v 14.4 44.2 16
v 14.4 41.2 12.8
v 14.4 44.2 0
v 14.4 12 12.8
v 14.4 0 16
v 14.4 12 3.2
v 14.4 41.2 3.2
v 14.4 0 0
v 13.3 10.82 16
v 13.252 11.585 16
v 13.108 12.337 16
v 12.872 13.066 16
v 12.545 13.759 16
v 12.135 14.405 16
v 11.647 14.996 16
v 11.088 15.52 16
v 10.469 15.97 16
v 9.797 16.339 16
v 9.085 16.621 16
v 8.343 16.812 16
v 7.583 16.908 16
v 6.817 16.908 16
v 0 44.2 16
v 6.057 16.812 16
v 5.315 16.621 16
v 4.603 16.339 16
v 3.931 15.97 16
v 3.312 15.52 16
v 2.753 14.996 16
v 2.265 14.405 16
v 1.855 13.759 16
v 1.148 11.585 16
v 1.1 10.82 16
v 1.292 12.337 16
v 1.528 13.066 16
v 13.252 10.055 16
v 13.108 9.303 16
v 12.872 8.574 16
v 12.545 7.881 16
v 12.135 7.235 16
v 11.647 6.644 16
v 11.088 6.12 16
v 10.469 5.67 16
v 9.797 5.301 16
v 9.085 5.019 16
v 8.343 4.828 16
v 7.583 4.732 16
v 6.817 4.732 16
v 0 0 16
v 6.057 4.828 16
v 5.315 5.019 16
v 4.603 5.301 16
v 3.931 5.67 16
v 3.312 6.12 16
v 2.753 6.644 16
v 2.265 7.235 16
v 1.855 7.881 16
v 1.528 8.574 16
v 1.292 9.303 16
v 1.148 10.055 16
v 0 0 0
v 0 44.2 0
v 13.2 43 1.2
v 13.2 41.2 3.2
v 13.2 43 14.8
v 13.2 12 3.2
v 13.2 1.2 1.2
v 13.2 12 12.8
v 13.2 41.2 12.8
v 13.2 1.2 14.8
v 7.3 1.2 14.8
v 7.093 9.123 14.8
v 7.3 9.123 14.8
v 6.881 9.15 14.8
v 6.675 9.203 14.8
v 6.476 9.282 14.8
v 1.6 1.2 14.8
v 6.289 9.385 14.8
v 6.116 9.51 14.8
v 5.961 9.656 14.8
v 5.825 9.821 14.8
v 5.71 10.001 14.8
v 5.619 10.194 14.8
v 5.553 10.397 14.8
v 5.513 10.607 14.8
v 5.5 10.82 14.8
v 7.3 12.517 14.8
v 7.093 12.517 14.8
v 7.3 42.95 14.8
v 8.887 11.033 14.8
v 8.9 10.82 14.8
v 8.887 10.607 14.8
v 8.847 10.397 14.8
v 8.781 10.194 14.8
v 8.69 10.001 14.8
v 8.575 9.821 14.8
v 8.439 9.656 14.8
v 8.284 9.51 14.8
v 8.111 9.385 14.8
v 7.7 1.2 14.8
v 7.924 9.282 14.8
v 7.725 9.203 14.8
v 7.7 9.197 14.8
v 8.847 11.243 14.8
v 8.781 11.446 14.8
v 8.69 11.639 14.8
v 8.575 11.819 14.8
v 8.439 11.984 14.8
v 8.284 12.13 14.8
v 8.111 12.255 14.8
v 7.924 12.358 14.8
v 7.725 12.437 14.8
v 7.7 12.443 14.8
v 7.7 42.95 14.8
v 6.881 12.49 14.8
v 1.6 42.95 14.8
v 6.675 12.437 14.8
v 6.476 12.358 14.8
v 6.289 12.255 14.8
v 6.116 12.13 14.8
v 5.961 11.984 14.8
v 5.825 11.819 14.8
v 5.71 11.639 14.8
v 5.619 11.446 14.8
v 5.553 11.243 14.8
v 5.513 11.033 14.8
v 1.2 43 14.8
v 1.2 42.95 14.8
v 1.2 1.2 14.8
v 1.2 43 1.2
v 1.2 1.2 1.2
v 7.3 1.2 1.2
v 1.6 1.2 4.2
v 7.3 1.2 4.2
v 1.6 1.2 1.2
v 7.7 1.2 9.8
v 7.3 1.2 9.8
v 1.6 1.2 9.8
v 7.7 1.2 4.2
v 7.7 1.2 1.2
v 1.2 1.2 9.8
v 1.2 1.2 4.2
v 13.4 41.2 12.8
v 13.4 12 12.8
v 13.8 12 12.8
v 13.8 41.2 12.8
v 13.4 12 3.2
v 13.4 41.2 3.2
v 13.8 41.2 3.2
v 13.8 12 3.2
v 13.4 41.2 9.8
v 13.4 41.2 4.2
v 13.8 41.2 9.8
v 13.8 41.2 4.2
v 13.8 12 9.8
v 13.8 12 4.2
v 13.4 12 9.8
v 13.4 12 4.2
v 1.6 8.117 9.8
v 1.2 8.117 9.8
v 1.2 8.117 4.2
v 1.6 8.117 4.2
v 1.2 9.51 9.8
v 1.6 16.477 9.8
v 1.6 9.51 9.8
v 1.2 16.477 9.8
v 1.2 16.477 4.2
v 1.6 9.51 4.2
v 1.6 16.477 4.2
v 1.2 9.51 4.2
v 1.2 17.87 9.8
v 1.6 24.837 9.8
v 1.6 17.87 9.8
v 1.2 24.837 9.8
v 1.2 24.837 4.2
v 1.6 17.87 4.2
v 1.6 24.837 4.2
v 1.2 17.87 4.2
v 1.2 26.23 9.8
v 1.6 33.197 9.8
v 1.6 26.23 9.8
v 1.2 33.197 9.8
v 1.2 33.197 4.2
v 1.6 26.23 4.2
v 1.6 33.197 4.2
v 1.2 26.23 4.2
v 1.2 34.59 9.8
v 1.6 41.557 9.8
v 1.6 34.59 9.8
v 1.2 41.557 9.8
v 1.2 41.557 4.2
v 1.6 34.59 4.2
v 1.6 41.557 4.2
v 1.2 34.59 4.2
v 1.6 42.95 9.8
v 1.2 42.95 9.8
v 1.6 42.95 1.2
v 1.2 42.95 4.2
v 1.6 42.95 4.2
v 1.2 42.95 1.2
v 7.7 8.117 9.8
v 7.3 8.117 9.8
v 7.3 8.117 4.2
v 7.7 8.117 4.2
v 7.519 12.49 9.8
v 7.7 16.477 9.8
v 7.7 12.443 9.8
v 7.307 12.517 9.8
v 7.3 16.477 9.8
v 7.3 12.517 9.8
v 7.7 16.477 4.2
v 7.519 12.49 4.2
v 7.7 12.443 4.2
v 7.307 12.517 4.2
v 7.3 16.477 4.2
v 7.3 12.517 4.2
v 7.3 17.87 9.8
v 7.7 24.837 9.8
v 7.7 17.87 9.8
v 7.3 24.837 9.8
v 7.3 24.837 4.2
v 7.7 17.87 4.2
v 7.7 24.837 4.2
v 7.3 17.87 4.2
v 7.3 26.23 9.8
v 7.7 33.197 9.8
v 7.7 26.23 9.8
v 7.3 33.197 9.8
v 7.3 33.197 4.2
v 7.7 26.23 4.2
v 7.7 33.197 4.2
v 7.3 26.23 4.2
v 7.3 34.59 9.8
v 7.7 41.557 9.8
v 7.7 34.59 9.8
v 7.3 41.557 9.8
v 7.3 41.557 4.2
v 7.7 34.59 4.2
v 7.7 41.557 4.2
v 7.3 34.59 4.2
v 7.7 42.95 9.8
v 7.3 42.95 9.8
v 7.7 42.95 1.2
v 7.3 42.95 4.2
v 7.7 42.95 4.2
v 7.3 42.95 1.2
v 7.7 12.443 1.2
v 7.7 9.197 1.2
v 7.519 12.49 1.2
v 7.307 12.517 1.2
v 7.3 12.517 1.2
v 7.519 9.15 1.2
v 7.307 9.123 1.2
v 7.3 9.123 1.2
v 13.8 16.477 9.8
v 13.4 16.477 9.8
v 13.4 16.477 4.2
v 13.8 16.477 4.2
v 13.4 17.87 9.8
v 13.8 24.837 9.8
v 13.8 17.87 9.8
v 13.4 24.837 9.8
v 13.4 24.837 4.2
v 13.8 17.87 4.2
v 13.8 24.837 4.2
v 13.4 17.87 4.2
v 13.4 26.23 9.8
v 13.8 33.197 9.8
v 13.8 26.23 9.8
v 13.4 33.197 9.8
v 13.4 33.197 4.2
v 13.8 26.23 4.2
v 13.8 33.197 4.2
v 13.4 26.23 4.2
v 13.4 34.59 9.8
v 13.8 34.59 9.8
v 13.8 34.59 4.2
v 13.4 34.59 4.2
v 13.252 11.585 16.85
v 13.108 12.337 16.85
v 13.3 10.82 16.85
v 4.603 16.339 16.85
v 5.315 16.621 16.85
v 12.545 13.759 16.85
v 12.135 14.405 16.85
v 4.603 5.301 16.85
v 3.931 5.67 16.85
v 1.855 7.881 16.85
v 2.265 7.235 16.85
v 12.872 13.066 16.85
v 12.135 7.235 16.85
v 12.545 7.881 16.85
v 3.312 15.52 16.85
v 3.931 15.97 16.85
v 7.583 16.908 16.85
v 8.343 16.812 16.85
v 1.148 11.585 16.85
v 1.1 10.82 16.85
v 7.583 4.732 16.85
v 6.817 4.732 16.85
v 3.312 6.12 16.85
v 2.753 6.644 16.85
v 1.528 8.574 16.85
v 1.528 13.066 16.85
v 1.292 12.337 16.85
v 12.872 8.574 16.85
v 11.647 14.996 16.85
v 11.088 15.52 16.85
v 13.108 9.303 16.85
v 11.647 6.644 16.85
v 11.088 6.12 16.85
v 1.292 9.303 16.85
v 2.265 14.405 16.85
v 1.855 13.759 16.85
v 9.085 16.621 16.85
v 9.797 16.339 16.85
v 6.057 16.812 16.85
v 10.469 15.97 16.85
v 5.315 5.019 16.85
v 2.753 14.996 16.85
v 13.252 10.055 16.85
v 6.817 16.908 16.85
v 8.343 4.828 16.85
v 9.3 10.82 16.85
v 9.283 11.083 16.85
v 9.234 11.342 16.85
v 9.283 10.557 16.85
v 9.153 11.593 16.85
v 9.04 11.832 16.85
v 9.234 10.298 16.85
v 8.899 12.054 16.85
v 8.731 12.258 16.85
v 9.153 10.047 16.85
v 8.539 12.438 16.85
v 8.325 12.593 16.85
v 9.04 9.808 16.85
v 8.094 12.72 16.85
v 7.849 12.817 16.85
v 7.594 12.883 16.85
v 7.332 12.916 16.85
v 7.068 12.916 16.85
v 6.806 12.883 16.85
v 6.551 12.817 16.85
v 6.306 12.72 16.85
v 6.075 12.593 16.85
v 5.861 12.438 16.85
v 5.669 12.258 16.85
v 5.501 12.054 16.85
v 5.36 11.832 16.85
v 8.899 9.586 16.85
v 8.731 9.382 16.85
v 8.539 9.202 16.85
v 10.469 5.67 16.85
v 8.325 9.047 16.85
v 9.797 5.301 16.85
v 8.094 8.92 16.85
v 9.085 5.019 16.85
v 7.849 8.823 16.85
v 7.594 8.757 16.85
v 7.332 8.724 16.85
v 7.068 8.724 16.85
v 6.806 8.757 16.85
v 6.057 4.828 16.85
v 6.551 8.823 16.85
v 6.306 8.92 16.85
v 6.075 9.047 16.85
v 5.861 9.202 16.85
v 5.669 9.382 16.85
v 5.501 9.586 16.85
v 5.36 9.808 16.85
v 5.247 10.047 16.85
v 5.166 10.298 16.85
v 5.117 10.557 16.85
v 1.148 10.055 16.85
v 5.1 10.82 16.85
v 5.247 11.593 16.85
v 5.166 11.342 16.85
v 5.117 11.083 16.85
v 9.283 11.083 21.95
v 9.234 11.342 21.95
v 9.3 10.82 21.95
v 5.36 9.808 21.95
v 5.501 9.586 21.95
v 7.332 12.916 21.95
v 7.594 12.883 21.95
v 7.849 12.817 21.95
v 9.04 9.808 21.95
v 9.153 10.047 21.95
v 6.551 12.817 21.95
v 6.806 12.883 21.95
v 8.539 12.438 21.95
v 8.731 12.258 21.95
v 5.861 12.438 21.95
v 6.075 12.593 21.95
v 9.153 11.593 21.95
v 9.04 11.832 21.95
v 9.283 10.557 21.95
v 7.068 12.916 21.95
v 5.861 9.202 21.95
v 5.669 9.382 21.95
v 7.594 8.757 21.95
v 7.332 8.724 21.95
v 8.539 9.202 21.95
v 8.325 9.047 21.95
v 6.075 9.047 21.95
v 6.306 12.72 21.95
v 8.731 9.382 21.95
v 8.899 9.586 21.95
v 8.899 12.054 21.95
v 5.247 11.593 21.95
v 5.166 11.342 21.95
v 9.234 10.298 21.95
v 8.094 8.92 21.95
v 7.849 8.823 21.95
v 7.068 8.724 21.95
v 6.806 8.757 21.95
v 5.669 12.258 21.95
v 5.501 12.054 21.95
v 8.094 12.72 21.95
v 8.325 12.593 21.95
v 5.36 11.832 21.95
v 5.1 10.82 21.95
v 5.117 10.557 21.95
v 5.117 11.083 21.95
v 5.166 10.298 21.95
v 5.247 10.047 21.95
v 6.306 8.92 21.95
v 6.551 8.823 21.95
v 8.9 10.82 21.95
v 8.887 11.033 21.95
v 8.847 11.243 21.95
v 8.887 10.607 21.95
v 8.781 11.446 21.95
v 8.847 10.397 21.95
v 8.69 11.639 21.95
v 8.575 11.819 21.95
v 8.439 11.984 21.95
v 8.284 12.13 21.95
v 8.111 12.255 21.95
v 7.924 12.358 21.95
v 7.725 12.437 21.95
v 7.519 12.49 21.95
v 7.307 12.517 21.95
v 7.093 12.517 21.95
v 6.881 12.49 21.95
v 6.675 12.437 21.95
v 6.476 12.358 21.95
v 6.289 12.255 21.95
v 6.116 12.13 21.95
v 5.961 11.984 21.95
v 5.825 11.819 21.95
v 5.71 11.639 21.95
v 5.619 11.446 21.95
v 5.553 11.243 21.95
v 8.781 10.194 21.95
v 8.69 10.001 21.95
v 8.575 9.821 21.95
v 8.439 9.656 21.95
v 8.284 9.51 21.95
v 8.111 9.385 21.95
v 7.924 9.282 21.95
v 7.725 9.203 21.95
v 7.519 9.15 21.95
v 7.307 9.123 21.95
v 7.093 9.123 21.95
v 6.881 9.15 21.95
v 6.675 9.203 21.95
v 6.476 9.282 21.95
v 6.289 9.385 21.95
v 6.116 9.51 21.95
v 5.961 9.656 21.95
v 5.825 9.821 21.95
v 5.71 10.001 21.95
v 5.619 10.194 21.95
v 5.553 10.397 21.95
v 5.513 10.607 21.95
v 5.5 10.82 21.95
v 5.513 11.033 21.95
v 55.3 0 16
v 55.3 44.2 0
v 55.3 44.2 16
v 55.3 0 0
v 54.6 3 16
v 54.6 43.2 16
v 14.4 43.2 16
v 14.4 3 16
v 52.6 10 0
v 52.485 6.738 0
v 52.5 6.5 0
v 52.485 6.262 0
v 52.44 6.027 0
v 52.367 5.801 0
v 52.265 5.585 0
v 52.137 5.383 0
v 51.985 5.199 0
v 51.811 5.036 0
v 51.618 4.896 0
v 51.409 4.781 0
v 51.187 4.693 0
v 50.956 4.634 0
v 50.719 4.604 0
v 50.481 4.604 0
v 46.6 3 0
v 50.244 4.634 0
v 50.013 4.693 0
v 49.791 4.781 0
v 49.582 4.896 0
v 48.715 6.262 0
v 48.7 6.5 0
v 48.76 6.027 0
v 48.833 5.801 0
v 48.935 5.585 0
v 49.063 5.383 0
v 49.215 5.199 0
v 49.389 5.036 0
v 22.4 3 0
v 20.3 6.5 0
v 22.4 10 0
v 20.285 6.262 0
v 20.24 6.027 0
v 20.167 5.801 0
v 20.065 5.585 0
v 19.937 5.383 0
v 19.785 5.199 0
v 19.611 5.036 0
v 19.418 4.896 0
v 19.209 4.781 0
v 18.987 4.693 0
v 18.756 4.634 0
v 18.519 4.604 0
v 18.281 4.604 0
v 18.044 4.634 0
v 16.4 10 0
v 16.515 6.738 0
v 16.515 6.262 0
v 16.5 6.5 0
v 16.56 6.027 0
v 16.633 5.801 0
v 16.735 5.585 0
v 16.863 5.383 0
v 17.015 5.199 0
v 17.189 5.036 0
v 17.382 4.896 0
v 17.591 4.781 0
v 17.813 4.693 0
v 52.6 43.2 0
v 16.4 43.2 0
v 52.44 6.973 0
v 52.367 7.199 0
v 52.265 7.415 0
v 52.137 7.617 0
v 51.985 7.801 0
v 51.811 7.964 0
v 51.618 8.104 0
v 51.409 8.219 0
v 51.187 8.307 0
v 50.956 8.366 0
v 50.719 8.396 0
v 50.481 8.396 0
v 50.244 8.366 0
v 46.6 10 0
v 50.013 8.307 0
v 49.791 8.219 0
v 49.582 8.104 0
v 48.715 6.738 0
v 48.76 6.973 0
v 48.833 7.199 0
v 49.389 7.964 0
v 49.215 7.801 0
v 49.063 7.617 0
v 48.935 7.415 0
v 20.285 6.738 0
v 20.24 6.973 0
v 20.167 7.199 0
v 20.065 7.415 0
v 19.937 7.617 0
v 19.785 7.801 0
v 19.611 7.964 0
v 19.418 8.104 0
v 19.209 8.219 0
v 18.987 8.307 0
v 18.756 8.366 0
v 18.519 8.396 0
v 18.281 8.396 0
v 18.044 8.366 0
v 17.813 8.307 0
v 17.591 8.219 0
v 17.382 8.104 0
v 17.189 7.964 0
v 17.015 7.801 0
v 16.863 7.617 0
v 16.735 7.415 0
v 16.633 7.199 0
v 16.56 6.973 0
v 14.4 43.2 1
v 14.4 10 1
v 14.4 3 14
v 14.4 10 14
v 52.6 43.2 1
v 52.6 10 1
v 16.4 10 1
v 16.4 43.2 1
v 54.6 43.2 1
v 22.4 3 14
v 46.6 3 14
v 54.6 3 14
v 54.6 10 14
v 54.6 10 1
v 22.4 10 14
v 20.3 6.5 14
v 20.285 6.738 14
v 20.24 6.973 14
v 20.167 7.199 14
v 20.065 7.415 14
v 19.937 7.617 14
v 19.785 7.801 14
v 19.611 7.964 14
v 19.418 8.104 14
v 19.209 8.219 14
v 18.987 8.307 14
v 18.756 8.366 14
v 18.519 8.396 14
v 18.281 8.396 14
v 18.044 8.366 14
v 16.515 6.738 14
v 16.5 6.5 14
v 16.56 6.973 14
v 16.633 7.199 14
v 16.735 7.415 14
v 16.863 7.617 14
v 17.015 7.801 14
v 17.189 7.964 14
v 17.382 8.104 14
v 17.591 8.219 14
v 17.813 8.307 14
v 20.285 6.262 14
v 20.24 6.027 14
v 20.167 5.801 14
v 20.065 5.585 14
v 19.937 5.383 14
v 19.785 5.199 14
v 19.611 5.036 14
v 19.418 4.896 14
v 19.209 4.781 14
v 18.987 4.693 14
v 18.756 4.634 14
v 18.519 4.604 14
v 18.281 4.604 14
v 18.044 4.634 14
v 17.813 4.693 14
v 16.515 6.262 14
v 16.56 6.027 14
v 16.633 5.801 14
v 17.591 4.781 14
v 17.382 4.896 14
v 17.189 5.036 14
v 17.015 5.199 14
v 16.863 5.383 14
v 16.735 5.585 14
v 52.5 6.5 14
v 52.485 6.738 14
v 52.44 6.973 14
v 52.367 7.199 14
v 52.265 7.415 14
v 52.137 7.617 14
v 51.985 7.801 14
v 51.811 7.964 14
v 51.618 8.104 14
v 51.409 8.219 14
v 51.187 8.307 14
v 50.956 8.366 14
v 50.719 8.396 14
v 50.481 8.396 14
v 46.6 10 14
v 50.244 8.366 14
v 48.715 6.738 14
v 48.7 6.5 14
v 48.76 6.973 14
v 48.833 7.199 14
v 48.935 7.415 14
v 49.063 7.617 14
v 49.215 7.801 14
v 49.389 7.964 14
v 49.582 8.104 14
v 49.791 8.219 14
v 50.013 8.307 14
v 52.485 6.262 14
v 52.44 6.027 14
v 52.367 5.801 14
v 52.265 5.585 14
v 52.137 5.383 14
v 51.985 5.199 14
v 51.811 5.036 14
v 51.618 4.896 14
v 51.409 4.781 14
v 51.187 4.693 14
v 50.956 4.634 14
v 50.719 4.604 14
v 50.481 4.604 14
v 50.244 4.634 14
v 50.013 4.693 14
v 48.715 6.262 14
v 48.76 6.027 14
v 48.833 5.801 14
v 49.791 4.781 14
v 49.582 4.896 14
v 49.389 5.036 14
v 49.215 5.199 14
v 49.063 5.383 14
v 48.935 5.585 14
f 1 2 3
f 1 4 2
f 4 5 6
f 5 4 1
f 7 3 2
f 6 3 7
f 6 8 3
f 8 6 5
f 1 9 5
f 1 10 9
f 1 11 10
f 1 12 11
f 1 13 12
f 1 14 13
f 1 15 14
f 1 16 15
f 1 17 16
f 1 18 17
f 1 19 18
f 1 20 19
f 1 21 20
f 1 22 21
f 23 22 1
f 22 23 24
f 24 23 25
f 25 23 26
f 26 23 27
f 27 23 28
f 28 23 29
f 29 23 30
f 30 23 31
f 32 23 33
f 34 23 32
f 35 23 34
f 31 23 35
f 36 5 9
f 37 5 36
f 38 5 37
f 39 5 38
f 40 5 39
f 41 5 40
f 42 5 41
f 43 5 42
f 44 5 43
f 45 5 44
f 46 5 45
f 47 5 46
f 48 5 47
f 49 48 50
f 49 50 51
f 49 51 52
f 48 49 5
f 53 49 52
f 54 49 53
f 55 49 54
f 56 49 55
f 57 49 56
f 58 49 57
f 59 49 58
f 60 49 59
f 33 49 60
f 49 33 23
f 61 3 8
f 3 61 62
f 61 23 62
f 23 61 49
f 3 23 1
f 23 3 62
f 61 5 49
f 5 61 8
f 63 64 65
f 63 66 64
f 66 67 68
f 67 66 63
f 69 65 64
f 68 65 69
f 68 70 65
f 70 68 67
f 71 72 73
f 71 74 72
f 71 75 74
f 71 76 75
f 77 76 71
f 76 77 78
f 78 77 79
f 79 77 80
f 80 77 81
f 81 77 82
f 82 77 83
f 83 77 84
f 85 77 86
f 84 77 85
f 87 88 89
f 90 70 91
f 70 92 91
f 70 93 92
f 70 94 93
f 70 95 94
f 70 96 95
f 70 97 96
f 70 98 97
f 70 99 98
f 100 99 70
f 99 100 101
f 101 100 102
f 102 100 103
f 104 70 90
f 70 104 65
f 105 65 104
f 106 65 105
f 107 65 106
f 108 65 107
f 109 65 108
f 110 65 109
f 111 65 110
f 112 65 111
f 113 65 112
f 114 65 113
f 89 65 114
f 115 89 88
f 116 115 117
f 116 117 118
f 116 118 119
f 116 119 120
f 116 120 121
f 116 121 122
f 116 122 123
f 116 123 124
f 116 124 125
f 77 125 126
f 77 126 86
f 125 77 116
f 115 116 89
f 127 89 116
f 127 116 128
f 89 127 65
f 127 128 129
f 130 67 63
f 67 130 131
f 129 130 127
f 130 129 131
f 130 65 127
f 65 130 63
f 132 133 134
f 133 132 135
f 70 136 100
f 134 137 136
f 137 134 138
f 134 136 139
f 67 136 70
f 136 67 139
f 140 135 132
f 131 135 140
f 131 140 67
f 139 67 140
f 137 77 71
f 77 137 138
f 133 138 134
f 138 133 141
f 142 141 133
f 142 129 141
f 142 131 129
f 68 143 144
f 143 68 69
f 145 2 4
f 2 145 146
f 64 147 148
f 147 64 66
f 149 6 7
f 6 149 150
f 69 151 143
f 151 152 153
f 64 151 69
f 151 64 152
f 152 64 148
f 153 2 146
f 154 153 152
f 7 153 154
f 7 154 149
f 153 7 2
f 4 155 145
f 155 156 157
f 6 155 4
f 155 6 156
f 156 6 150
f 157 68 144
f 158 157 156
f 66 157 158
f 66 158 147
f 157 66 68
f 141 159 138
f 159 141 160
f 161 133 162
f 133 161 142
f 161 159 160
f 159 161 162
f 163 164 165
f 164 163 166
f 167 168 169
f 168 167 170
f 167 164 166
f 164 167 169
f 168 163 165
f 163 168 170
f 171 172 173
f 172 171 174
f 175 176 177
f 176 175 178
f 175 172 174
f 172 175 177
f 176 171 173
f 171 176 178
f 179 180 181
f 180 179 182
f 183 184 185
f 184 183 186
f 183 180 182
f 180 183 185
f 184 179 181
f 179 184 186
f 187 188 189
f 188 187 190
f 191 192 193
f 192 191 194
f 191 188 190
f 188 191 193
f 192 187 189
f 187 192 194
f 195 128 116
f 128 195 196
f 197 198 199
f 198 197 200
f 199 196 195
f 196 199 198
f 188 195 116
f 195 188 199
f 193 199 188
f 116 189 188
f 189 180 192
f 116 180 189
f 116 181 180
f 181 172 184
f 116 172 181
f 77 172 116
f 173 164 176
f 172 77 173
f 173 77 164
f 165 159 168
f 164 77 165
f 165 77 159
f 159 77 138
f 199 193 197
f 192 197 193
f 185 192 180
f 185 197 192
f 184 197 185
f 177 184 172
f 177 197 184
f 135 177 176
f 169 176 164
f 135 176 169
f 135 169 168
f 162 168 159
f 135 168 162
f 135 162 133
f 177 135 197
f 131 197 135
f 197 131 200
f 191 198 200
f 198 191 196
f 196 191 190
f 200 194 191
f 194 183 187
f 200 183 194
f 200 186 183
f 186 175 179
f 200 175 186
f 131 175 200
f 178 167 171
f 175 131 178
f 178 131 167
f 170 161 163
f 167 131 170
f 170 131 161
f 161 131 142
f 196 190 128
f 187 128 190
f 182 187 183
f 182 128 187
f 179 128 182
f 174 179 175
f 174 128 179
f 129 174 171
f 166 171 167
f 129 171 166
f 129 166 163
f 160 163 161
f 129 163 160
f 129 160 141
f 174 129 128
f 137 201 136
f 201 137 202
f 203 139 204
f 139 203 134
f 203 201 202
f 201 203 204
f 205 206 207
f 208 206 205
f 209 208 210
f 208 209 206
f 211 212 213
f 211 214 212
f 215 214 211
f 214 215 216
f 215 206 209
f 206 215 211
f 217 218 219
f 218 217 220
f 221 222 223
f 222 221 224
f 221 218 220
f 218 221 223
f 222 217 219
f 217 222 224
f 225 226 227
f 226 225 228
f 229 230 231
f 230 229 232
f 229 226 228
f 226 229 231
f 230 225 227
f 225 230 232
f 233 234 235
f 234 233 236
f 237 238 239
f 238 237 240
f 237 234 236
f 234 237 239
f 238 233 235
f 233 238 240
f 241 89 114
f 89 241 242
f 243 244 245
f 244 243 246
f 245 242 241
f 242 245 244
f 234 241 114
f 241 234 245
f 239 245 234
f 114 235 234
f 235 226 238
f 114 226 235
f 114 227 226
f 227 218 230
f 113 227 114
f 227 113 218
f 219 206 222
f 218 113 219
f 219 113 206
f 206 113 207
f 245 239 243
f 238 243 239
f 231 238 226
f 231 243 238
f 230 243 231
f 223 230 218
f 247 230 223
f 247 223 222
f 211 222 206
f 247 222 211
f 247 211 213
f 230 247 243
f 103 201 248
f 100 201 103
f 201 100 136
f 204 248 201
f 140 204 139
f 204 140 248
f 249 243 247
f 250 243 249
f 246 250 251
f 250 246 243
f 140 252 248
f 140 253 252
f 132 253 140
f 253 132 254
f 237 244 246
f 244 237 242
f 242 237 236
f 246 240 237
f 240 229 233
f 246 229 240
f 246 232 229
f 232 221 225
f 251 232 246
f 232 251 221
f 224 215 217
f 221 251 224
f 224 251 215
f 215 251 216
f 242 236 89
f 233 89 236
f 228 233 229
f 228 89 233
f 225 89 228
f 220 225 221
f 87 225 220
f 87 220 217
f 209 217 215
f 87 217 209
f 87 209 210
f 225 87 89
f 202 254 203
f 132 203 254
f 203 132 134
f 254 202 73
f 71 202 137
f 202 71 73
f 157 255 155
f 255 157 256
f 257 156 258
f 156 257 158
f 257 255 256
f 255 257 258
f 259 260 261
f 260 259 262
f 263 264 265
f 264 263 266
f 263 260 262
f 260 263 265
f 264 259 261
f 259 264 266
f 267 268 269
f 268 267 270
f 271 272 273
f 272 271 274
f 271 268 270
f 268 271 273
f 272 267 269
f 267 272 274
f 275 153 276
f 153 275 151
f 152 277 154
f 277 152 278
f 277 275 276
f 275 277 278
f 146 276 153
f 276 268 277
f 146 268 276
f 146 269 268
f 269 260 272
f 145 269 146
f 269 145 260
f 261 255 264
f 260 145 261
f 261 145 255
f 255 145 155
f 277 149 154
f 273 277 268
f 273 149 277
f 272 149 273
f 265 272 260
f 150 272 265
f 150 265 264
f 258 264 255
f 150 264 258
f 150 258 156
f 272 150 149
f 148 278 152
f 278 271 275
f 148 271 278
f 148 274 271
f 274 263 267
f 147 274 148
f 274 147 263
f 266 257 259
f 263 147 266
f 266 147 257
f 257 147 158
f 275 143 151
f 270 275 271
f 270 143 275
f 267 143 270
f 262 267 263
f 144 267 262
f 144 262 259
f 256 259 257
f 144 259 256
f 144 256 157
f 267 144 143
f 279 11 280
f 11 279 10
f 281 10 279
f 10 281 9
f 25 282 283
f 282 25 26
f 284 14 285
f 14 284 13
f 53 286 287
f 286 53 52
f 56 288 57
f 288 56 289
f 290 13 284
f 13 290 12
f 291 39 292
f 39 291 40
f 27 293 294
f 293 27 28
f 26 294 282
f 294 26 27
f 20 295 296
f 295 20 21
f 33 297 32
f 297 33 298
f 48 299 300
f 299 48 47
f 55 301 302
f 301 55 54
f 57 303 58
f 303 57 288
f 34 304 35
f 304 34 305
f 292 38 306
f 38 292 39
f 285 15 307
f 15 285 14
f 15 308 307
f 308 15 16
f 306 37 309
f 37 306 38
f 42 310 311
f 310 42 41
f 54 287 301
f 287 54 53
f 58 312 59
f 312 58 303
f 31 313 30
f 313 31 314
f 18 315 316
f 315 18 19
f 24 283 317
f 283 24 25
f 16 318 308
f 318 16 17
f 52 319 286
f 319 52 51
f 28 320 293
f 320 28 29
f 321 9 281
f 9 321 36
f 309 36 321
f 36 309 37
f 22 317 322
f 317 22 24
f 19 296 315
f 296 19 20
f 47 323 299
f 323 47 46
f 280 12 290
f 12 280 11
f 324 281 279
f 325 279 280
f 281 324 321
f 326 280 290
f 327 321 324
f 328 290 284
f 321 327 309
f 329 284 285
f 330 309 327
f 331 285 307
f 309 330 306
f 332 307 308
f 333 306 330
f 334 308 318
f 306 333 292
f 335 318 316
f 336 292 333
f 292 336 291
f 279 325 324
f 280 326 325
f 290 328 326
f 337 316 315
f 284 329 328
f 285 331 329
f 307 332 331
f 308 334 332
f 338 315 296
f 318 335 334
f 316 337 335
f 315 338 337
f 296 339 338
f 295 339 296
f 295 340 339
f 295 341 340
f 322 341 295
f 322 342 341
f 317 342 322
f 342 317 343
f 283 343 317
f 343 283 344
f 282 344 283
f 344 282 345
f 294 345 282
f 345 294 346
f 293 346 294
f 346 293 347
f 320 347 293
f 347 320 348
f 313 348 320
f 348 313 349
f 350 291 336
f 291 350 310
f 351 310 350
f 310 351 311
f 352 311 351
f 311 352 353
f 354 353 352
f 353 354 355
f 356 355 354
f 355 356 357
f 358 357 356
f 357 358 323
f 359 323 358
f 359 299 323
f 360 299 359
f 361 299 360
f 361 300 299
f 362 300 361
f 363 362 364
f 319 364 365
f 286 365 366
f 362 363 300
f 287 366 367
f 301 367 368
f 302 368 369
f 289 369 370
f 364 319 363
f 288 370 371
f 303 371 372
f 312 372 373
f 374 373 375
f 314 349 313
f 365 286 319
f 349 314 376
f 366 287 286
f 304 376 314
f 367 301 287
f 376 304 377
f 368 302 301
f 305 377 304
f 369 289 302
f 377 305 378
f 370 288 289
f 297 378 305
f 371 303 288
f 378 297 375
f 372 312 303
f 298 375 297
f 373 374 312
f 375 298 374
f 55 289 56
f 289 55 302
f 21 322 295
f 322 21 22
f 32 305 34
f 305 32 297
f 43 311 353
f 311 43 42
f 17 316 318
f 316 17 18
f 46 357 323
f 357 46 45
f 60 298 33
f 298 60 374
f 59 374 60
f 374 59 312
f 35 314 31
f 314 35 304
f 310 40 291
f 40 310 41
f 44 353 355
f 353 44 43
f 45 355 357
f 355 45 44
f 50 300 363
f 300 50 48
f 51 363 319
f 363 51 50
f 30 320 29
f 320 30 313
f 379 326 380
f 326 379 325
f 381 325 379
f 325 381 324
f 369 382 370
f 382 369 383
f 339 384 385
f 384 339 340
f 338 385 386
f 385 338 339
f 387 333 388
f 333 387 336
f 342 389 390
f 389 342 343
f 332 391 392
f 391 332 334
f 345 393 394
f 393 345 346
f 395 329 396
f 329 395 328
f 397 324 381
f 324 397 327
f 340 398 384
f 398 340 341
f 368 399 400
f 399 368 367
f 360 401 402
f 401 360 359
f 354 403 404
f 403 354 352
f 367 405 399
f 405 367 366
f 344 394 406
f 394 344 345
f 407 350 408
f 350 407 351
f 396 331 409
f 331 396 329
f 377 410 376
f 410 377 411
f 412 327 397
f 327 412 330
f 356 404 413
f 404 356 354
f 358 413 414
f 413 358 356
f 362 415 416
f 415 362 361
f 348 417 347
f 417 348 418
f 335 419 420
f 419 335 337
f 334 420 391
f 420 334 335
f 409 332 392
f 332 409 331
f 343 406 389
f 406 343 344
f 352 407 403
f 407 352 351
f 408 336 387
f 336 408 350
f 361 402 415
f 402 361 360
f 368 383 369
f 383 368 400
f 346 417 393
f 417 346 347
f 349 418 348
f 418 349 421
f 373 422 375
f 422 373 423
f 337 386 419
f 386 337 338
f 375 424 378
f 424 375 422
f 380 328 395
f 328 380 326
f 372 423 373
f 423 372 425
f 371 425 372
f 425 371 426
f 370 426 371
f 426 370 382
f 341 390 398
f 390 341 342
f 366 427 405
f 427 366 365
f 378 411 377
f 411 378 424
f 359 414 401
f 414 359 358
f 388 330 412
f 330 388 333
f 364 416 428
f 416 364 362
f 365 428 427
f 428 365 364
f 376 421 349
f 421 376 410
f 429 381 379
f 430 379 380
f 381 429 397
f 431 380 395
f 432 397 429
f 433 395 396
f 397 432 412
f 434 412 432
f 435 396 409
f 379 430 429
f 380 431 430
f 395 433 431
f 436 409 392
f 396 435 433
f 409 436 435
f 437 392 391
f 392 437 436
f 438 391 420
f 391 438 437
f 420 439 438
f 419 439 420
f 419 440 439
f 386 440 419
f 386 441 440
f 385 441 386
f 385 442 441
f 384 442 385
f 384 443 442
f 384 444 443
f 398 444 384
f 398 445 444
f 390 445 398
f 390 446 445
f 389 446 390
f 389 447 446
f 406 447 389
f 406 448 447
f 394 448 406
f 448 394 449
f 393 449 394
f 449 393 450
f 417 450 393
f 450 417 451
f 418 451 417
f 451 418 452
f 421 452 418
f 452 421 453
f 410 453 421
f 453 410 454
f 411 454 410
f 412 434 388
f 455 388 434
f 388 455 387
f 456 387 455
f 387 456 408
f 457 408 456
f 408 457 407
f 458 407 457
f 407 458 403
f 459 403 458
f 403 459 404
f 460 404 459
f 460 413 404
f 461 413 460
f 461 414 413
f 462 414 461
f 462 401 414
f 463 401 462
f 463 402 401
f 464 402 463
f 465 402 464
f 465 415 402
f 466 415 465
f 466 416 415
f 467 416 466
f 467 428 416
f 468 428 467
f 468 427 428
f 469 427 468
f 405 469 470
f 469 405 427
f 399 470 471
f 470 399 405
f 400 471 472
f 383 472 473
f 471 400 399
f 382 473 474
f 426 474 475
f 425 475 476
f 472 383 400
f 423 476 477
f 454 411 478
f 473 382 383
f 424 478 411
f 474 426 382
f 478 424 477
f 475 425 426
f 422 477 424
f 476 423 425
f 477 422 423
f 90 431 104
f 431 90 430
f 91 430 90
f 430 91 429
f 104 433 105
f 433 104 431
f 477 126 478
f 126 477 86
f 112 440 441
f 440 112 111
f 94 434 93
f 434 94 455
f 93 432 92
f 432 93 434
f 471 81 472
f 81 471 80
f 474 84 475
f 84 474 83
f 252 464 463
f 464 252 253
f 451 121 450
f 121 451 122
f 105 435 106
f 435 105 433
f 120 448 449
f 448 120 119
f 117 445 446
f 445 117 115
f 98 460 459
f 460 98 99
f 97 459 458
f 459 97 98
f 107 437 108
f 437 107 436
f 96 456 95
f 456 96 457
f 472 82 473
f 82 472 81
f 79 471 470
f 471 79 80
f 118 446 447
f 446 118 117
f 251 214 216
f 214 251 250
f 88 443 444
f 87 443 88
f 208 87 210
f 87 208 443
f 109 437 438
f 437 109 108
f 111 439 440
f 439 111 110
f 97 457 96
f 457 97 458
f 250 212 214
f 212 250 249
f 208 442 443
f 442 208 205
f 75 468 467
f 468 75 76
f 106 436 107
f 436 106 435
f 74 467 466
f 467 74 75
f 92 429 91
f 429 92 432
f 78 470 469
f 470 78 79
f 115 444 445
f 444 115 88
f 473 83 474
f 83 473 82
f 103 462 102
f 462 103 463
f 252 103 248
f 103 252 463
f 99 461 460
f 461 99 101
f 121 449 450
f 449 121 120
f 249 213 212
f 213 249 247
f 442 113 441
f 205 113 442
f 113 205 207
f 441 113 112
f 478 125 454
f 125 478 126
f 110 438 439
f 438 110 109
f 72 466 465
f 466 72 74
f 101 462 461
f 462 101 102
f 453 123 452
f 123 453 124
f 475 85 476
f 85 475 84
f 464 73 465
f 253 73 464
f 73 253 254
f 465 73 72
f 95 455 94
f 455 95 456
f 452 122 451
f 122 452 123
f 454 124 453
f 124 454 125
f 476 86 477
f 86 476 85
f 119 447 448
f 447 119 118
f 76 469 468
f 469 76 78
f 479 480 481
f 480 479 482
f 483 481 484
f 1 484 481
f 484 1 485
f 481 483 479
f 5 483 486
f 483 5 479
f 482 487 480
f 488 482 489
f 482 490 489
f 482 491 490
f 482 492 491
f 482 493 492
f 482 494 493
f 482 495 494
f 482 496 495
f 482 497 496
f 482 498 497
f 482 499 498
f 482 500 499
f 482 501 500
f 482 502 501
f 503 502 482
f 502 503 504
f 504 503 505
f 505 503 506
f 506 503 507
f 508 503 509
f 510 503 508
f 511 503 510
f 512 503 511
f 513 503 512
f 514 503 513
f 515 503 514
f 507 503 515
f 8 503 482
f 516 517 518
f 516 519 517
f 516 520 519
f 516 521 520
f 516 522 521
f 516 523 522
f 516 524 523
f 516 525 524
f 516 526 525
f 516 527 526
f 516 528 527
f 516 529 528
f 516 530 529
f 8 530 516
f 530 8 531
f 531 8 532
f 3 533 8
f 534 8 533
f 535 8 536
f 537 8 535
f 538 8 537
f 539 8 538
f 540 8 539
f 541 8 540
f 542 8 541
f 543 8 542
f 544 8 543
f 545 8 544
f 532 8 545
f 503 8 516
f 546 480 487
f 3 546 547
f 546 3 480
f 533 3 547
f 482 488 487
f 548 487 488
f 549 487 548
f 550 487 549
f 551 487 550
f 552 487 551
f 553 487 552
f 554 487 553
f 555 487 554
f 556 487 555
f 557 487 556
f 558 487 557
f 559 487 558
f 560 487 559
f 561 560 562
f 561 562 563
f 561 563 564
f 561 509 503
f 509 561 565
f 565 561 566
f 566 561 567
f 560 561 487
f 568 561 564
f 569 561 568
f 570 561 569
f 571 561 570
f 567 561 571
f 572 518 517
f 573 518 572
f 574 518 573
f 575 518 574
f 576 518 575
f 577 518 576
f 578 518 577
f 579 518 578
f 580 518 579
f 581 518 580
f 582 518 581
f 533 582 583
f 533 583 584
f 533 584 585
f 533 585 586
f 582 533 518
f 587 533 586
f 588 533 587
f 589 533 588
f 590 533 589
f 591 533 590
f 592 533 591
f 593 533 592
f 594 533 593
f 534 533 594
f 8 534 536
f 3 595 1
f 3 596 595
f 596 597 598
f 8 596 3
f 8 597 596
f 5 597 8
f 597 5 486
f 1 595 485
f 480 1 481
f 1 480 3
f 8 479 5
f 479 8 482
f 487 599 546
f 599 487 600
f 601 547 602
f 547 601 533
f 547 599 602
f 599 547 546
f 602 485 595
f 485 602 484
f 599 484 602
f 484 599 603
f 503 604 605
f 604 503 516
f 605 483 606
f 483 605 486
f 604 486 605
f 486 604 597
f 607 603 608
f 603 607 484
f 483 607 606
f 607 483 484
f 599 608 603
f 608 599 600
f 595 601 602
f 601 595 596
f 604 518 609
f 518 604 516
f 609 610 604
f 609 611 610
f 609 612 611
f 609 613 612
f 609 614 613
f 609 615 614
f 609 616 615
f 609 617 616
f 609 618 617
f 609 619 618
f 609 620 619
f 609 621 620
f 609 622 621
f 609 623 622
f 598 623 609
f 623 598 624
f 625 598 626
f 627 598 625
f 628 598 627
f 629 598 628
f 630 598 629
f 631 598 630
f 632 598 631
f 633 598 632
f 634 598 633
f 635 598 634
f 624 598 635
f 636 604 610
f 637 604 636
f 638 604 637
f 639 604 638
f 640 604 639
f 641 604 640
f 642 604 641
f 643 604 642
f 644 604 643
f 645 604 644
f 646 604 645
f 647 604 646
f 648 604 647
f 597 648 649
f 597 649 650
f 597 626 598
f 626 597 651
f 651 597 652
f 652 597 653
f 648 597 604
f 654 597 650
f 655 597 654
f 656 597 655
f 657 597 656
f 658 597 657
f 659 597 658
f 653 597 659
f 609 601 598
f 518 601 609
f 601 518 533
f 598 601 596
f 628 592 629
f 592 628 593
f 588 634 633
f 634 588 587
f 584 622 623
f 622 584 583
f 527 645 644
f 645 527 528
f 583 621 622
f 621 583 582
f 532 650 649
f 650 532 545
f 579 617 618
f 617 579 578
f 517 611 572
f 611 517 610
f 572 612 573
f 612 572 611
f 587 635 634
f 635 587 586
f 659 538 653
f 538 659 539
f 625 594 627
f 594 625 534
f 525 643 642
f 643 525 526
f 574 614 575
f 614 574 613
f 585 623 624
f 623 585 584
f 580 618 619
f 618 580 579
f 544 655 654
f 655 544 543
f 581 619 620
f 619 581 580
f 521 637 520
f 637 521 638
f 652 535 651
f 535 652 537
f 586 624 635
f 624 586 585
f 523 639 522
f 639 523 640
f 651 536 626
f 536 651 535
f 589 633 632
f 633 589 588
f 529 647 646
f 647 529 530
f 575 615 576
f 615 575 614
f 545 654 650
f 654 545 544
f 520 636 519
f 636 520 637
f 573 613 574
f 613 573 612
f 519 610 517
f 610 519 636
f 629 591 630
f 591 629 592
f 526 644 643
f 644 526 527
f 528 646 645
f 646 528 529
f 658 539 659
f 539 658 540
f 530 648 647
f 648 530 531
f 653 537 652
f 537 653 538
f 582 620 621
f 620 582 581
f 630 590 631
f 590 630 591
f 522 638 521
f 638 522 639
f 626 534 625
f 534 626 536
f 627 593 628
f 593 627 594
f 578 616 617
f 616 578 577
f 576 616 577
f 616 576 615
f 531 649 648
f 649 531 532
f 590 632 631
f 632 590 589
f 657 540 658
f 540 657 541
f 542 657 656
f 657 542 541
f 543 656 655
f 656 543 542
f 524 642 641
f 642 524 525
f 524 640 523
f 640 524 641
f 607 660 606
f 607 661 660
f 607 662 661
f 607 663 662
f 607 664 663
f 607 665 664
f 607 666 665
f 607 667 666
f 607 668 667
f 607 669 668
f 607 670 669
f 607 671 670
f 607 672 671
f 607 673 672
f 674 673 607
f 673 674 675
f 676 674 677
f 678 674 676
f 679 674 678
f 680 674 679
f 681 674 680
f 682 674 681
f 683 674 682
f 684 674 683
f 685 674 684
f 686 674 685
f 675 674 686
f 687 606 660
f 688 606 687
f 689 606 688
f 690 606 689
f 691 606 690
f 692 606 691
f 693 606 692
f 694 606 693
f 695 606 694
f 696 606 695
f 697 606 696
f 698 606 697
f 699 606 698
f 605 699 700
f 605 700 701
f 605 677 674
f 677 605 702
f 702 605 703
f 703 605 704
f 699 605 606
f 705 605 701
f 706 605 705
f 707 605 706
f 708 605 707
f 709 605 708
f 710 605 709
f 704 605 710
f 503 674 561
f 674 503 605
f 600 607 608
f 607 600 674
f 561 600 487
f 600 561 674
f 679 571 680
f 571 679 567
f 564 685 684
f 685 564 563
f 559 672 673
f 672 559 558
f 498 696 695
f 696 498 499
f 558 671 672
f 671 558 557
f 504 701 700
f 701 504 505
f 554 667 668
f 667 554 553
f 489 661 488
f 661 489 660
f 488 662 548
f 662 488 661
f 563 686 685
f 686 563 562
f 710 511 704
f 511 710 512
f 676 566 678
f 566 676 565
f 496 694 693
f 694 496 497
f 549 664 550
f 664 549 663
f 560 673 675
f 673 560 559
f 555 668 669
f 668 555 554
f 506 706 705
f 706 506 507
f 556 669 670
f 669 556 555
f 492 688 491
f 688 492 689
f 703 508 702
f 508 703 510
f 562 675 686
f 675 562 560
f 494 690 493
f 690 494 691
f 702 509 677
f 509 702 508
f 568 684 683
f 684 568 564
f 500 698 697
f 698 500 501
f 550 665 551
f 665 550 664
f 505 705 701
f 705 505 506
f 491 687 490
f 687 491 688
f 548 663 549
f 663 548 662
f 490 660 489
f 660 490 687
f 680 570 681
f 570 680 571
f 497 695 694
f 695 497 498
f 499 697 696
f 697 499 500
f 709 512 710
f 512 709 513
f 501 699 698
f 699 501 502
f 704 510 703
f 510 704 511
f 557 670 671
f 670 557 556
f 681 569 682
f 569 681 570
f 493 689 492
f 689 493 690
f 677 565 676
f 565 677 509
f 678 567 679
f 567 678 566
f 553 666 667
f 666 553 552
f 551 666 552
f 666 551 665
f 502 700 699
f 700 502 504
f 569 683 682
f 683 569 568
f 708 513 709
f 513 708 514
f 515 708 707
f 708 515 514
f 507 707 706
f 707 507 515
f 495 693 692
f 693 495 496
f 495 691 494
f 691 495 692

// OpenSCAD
// MK8 air cage, for Prusa i3 Pro B. traps air from extruder feeder cooler, routes to pipe end, where an air nozzle
// can be connected to.
//
// 2016Sep13, ls  (http://www.thingiverse.com/Bushmills)
//	v0.0.1   initial version
//	v0.0.2   support changed to interleaved pillars 
// 2016Sep14, ls
//	v0.0.3   support changed to perforated walls. lowered blocks. thicker walls around air chamber.
//               gave pipe end foundation more substance.
// 2016Sep15, ls
//	v0.0.4   added foundation to pipe end to avoid sagging
// 2016Sep19, ls
//	v0.0.5   eliminated "pillars_" from air chamber variable names, changing to "wall_" 
//	         own variable for pipe end wall thickness. rather than reusing air chamber wall thickness. 
//	         slicing may benefit from slic3r --spiral-vase option.

$fn=50;
// show object inside at percentage depth
explode=0;			// [0:100]

// *********************************************************
/* main frame setting */

// adjustable in very small steps, because this determines the degree of leakyness 
cooler_width=40.2;		// [32:0.1:64]

// adjustable in very small steps, because this determines the degree of leakyness 
cooler_height=40.2;		// [32:0.1:64]

// overall depth of item, excluding pipe end
depth=16;			// [10:0.1:32]

// how far does extruder side retainment protrude into cooler
brim=2;                         // [0:0.1:10]

// how thick is extruder side retainment
brim_strength=1;			// [0.4:0.1:5]

// thickness of frame opposite of air chamber 
far_wall=0.7;			// [0.4:0.1:5]

// thickness of frame on side of holding blocks 
base=3;				// [0.4:0.1:10]

// thickness of opposite side  
roof_wall=1;			// [0.4:0.1:5]

height=base+cooler_height+roof_wall;


// *************************************************
/* mounting blocks */

block_height=7;			// [2:0.1:20]

// affects hole distance, which is (cooler_width - block_width) as holes are block centered 
block_width=8;			// [2:0.1:20]

// bore diameter for screws
mount_hole=3.8;			// [2:0.1:8]

// fan immersion shortens blocks on fan side, allowing fan to penetrate air cage, reducing leakage.
fan_immersion=1;		// [0:0.1:8]


// ***********************
/* air chamber settings */

// thickness of walls surrounding air chamber, and pipe and wall strength
air_chamber_wall=1.2;		// [0.1:0.1:8]

// "chamber" refers to dimensions of hollow space inside
air_chamber_width=12;		// [4:1:32]

// brim around air passage
air_passage_brim=2;		// [0:0.1:8]

airpassage_length=cooler_height-block_height-2*air_passage_brim;

width=far_wall+cooler_width+air_chamber_width+2*air_chamber_wall;

air_chamber_height=height-2*air_chamber_wall;
air_chamber_depth=depth-2*air_chamber_wall;
air_chamber_x=far_wall+cooler_width+air_chamber_wall;
air_chamber_y=air_chamber_wall+0;

// support for pipe end sided roof. distance means "maximum distance", as actual distance will be calculated
wall_distance=8;		// [1:0.1:24]

// thickness of air chamber walls, seperating lanes
wall_strength=0.4;		// [0.2:0.1:2]

// **********************************************
/* pipe end */

pipe_end_foundation_length=1;	// [0:0.1:8]
pipe_end_foundation_foot=4; 	// [0:0.1:8]
pipe_end_length=5;		// [0:0.1:16]

// outer diameter
pipe_end_diameter=4.2;		// [1:0.1:8]
pipe_end_wall=0.4;		// [0.2:0.1:4]
pipe_end_elevation_percent=20;	// [0:100]

pipe_end_radius=pipe_end_diameter/2;
pipe_end_x=air_chamber_width/2+air_chamber_wall;
pipe_end_y=air_chamber_wall+pipe_end_radius;
little=0.1+0;


// ************************************************************

lanes=ceil((air_chamber_width-wall_strength)/wall_distance);
lanes_spacing=(air_chamber_width+air_chamber_wall/(lanes+1)-wall_strength/2)/lanes;

module wall()  {
	difference()  {
		cube([wall_strength, air_chamber_height, air_chamber_depth]);

		for (i=[0:5])   {
		translate([-little/2, i*air_chamber_height/5, 3])
		cube([wall_strength+little, air_chamber_height/6, air_chamber_depth-8]);
		}
	}
}

module support()  {
	for (lane=[0:lanes])  {
		translate([lane*lanes_spacing+air_chamber_wall, air_chamber_wall-little/2, air_chamber_wall])
		wall();
	}
}


module pipe_end_bore()  {
	cylinder(depth+pipe_end_length-air_chamber_wall+pipe_end_foundation_length+little/2,
	pipe_end_radius-pipe_end_wall,
	pipe_end_radius-pipe_end_wall);
}

module pipe_end()  {
	translate([0, 0, -little])
	cylinder(pipe_end_foundation_length,
	         pipe_end_radius+pipe_end_foundation_foot,
                 pipe_end_radius+pipe_end_foundation_foot);

	cylinder(pipe_end_length+pipe_end_foundation_length,				// pipe
		pipe_end_radius,
		pipe_end_radius);

}

module air_chamber()  {
	difference()  {
		union()  {
		        difference()  {
				cube([air_chamber_width+2*air_chamber_wall, height, depth]);			// air chamber enclosure

				translate([air_chamber_wall, air_chamber_wall, air_chamber_wall])		// carve out air chamber
				cube([air_chamber_width, air_chamber_height, air_chamber_depth]);		

				translate([air_chamber_wall+air_chamber_width-little/2,				// air passage opening
				           base+block_height+air_passage_brim,
				           air_chamber_wall+air_passage_brim])
				cube([air_chamber_wall+little,
				      airpassage_length,
				      air_chamber_depth-2*air_passage_brim]);
			}

			support();

			translate([pipe_end_x,
				pipe_end_y+(air_chamber_height-pipe_end_diameter)*pipe_end_elevation_percent/100,
				depth-little/2])
			pipe_end();

		}

		translate([pipe_end_x,
		           pipe_end_y+(air_chamber_height-pipe_end_diameter)*pipe_end_elevation_percent/100,
	        	   air_chamber_wall])
		pipe_end_bore();
	}
}




module block(width, height, depth, dia)  {
	difference()  {
		cube([width, height, depth-fan_immersion]);

		translate([width/2, height/2, -little/2])
		cylinder(depth+little, dia/2, dia/2);
	}
}

module cooler_frame()  {

	difference()  {

		cube([cooler_width+far_wall, height, depth]);			// base block

		translate([brim, base, -little/2])			// bottom (extruder-faced) opening
		cube([cooler_width-2*brim, cooler_height, brim_strength+little]);

		translate([-little/2, base, brim_strength])		// cooler containment
		cube([cooler_width+little/2, cooler_height, depth-brim_strength+little]);
	}

	for (x=[0:1])
	translate([x*(cooler_width-block_width), base, 0])
	block(block_width, block_height, depth-fan_immersion, mount_hole);	// fan mount block 
}


module air_cage()  {
	air_chamber();

	translate([air_chamber_width+air_chamber_wall*2, 0, 0])
	cooler_frame();
}


difference()  {
	air_cage();

	if(explode)
	translate([0-little/2, 0-little/2, depth*explode/100])
	cube([width+little, height+little, depth*(100-explode)/100+little/2]);
}
